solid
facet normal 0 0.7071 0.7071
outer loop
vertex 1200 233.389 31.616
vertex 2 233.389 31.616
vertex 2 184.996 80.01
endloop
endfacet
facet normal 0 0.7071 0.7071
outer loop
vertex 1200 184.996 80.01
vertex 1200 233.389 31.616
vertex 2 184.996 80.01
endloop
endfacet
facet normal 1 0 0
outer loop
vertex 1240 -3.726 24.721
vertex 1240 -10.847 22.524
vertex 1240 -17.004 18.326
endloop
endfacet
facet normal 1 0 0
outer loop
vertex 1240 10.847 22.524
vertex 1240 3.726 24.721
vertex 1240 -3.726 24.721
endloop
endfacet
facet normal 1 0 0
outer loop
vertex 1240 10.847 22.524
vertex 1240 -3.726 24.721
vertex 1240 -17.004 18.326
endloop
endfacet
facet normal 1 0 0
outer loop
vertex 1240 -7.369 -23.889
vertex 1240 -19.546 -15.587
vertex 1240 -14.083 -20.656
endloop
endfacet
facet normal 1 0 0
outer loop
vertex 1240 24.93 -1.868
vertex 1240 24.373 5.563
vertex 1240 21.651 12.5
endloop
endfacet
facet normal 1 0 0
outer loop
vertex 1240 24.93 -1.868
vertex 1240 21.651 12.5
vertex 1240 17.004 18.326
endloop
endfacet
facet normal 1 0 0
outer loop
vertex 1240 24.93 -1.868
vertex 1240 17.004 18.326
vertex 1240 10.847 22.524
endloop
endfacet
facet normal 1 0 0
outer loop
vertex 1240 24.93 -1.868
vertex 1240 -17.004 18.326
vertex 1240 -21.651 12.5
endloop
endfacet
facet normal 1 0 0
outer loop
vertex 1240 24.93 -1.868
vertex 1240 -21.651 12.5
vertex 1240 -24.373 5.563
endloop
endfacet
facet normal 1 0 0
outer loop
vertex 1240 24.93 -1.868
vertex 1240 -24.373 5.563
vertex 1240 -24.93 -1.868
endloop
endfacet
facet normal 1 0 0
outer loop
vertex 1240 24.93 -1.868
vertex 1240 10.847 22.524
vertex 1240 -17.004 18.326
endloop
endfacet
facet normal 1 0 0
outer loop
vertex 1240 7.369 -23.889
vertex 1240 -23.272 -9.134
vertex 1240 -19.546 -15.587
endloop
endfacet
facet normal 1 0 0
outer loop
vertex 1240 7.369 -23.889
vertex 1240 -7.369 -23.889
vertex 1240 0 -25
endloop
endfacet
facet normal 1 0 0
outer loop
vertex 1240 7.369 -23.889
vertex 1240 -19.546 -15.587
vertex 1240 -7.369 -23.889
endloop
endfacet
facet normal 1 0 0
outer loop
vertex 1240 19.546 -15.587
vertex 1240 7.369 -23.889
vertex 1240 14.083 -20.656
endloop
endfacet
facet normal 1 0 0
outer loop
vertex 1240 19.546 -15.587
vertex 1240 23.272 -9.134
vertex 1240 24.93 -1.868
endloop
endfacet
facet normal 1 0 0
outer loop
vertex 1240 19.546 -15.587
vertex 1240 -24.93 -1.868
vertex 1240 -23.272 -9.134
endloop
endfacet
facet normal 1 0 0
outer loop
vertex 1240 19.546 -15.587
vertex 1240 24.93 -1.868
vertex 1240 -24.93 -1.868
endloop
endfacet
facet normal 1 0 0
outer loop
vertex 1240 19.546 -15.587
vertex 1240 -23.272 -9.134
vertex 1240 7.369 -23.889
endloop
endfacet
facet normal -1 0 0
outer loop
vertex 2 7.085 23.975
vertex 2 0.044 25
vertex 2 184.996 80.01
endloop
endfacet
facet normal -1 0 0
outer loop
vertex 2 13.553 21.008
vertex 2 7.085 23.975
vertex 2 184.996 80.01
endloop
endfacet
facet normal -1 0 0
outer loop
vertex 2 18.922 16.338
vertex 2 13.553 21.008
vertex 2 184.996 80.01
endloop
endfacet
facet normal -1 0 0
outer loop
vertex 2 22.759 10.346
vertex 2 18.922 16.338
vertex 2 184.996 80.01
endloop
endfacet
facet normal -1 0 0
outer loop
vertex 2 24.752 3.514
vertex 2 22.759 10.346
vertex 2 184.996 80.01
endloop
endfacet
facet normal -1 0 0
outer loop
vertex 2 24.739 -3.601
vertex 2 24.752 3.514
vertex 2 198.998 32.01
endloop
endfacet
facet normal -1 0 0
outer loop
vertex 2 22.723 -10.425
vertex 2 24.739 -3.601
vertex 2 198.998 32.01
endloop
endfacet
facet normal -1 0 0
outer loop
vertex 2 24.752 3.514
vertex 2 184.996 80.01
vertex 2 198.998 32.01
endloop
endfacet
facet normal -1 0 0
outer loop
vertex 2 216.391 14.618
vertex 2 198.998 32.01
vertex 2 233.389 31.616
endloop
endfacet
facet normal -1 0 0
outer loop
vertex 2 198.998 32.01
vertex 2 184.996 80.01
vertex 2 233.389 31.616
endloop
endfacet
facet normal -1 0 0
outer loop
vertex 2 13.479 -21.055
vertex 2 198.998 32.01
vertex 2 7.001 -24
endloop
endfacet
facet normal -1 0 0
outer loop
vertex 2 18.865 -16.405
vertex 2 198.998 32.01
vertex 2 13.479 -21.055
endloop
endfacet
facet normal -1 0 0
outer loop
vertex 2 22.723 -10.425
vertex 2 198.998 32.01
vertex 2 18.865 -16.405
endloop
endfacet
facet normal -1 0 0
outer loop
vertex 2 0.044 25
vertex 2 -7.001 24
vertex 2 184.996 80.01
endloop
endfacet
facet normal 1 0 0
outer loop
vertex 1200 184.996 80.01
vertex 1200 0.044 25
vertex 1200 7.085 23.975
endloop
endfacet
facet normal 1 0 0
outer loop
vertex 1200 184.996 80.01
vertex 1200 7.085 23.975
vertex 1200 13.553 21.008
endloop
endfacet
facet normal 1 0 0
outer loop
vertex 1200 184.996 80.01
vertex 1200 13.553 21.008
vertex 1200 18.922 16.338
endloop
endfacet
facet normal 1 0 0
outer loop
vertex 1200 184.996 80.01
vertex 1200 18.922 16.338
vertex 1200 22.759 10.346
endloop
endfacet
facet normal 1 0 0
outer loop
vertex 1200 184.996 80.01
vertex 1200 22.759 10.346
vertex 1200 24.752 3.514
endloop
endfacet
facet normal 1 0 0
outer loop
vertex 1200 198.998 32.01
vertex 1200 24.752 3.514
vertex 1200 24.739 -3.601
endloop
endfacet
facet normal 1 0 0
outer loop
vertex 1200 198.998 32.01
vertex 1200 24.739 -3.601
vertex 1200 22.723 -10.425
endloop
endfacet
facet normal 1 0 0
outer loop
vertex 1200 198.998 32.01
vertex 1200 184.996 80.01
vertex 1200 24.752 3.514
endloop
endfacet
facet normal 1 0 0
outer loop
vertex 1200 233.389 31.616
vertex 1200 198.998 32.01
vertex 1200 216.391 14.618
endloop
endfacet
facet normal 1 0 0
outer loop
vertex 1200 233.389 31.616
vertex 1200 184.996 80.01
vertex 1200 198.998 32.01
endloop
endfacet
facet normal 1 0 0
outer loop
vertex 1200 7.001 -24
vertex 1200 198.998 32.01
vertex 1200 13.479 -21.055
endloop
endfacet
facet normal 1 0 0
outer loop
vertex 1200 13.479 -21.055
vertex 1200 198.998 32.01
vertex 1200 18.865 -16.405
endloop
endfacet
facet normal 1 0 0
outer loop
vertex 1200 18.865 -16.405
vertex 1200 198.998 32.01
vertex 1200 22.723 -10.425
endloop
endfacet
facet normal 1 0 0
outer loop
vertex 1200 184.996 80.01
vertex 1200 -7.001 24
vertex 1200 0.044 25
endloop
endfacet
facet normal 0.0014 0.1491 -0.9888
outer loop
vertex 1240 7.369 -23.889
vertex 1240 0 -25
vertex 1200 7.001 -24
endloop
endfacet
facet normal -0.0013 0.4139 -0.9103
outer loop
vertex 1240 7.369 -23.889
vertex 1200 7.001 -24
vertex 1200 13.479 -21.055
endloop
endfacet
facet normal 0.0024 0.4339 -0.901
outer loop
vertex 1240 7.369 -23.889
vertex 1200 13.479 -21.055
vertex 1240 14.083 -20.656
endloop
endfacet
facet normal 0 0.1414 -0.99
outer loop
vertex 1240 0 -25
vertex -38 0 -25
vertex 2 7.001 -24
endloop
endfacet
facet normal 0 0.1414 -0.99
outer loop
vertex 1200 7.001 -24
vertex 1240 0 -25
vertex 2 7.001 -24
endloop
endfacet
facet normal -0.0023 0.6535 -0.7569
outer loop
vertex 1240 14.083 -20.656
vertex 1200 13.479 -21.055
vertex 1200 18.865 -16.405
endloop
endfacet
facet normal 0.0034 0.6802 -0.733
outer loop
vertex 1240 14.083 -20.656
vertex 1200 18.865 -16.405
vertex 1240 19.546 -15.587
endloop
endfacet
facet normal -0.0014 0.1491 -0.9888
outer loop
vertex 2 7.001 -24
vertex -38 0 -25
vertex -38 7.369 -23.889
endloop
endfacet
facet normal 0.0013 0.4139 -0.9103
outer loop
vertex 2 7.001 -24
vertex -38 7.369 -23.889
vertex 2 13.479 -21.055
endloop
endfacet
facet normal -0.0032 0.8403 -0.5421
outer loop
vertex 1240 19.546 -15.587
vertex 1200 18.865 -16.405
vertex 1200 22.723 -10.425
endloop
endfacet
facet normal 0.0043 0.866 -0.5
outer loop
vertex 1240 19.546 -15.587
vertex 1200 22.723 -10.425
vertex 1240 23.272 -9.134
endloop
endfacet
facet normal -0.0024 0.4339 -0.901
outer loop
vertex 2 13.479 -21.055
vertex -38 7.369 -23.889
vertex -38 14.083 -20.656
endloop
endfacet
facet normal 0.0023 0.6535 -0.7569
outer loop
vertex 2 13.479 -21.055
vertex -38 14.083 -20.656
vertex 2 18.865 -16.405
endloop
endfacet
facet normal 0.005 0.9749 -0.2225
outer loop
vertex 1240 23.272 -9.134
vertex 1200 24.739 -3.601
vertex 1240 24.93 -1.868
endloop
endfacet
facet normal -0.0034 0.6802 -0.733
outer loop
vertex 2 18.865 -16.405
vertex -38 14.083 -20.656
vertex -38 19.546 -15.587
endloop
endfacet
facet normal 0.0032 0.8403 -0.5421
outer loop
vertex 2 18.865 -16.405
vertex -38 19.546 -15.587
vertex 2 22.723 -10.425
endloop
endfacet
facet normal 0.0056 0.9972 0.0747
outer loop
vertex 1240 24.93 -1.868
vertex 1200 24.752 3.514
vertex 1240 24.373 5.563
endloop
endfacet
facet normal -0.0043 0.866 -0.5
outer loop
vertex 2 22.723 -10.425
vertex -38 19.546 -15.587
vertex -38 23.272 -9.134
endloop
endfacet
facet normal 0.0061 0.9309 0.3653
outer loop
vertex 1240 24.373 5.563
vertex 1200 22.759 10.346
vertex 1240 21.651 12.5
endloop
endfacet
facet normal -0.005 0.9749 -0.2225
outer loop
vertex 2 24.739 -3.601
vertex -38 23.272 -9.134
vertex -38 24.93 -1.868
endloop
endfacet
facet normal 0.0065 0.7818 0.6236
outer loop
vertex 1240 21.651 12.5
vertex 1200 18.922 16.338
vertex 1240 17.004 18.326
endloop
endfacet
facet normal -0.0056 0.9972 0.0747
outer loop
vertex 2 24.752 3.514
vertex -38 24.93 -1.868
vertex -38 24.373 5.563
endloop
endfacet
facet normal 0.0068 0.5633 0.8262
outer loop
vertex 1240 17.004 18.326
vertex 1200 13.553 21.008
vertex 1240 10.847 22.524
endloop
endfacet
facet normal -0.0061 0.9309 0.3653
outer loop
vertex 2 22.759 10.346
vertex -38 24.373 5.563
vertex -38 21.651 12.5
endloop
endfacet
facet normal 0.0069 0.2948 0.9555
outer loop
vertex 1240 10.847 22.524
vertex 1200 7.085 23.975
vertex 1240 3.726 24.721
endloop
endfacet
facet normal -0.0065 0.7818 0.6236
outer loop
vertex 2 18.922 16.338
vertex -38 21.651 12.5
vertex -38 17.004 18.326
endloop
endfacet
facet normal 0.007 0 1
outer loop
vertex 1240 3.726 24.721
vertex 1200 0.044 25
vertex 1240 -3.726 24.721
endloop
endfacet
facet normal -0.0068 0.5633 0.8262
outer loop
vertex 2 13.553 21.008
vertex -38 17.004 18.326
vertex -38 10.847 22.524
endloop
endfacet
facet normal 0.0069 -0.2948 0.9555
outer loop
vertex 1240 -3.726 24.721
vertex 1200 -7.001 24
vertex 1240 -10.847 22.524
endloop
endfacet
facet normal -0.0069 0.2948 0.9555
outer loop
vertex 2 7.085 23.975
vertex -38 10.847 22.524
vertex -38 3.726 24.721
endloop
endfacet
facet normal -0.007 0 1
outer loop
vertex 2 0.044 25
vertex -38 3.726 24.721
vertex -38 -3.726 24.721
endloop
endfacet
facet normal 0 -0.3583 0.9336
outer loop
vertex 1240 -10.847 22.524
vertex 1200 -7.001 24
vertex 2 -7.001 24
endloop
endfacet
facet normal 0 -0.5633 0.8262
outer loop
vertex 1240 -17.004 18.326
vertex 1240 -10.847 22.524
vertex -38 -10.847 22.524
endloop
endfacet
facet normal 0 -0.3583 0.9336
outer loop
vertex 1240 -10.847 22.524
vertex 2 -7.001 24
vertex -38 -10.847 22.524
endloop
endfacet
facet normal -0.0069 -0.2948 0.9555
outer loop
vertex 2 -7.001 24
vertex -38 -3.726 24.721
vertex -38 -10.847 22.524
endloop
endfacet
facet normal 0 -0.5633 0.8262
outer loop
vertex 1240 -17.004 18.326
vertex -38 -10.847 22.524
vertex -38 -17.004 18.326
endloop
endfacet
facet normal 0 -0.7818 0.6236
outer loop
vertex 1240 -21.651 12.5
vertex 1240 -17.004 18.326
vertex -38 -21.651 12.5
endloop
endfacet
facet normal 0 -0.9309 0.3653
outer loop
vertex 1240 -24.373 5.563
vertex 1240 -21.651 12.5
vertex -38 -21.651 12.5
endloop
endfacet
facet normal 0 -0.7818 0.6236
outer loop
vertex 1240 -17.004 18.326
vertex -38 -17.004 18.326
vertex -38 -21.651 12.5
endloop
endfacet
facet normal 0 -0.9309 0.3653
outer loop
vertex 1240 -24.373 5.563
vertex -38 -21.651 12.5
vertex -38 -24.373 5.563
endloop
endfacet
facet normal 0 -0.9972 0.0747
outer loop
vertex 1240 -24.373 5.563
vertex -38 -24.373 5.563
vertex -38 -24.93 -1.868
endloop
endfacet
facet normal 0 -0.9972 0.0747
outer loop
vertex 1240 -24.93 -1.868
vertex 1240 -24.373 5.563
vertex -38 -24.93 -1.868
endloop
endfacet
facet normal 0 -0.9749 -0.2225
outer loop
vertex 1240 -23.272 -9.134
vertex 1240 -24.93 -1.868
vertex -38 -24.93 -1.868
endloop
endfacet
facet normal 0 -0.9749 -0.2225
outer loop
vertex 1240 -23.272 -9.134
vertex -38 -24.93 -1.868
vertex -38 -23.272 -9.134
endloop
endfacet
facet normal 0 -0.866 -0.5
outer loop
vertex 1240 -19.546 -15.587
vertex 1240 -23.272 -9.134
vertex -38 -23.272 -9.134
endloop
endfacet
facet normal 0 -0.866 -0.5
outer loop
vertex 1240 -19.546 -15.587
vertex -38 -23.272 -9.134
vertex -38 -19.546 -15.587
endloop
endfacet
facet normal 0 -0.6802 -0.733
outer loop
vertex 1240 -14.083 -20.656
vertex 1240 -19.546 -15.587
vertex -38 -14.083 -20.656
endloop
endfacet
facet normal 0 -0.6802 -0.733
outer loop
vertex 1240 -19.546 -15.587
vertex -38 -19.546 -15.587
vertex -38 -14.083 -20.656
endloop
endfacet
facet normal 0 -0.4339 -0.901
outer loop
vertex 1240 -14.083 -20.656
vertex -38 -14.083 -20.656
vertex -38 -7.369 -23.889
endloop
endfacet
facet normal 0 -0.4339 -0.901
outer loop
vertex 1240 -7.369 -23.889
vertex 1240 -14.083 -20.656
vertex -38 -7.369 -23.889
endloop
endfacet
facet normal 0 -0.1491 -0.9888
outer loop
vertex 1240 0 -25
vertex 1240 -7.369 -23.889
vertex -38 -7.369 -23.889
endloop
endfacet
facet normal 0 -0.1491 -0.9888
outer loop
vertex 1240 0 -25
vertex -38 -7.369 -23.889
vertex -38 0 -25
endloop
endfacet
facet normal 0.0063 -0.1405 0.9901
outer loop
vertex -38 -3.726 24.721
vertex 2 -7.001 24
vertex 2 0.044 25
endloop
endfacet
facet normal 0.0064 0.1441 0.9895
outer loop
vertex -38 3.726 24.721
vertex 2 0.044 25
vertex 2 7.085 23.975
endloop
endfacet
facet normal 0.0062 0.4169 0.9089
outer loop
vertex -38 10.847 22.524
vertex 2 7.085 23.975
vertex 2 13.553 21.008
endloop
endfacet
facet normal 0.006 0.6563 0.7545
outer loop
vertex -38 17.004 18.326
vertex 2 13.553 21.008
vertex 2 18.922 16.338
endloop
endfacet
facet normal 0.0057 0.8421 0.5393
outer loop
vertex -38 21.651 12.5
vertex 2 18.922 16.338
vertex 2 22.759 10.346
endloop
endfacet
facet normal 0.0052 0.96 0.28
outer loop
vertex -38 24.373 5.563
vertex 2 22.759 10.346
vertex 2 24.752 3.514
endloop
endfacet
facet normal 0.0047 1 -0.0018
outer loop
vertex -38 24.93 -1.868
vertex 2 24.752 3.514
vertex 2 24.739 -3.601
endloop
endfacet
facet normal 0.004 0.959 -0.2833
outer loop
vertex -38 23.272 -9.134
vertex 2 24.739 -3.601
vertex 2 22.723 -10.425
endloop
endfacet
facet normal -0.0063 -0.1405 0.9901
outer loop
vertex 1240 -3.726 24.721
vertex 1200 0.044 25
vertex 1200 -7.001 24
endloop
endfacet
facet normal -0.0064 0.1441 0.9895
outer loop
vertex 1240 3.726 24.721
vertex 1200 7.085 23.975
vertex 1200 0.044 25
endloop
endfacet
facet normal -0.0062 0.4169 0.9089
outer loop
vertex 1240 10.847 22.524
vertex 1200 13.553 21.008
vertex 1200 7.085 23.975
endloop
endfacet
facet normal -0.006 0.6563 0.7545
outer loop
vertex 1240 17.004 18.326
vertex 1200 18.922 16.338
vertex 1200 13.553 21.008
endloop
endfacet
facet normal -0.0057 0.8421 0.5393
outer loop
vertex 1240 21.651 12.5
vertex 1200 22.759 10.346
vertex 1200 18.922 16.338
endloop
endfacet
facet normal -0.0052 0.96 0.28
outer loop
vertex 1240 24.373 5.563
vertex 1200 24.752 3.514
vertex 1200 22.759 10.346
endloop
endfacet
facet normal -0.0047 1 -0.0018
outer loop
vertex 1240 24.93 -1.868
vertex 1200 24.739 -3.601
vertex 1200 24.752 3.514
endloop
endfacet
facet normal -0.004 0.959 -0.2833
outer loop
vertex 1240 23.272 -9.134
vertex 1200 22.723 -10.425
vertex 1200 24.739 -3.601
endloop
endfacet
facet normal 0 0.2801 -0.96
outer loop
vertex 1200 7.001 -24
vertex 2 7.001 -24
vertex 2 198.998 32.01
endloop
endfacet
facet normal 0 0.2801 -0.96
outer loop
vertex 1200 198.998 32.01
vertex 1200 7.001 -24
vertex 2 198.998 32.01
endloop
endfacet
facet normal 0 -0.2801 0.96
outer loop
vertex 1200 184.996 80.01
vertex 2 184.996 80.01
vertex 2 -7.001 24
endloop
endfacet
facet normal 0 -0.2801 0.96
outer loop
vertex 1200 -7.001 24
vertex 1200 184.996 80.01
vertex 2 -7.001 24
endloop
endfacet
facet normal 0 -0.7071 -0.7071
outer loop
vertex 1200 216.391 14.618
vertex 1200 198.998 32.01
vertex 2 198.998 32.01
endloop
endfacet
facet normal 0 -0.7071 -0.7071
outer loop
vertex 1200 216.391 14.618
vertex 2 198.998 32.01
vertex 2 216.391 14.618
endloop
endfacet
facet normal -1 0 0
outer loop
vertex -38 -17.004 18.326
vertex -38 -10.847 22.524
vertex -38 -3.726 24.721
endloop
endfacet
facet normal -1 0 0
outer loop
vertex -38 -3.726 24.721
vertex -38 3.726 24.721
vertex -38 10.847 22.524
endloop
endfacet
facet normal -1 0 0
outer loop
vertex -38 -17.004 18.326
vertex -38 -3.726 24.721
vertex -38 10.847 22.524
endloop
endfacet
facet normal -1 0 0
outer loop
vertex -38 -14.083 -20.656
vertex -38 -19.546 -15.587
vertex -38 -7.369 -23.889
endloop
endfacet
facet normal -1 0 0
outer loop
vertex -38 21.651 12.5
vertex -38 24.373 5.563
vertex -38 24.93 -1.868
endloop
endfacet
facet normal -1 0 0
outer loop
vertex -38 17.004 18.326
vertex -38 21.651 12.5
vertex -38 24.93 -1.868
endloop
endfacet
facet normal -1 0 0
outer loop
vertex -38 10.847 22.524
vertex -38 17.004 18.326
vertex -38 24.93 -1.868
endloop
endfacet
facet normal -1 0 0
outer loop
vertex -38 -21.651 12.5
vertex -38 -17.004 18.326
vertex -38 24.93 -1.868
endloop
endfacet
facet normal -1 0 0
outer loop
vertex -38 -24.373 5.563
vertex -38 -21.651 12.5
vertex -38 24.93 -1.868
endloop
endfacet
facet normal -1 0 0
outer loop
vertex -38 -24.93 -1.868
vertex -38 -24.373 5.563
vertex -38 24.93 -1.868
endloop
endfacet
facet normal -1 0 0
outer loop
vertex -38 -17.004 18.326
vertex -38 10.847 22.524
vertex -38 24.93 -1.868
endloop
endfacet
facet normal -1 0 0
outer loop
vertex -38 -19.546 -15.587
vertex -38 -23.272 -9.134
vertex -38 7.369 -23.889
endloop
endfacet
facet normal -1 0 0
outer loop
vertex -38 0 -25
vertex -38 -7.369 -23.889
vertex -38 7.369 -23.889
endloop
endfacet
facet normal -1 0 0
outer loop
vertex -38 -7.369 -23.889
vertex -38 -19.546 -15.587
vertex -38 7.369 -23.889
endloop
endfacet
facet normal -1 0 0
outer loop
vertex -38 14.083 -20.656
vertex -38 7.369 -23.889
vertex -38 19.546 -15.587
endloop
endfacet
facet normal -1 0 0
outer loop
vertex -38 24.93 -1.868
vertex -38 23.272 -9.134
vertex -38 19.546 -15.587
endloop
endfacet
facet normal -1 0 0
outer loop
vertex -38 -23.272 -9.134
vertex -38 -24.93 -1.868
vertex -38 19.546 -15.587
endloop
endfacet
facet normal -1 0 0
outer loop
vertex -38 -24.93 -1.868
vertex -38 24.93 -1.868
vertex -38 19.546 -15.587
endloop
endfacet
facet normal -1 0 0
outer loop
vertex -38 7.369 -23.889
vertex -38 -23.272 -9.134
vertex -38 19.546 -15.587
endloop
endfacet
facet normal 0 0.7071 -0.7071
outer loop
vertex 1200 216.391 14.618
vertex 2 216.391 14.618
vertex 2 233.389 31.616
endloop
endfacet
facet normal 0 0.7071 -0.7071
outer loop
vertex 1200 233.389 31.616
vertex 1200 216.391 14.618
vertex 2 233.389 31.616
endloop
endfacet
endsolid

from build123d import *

# Parameters (mm, degrees)
SKETCH1_R                = 25
BOSS_EXTRUDE1_DEPTH      = 1200
BOSS_EXTRUDE2_START      = -1198
BOSS_EXTRUDE2_DEPTH      = 1198
BOSS_EXTRUDE3_DEPTH      = 40
BOSS_EXTRUDE3_DEPTH_BACK = 1238
SKETCH3_R                = 25


with BuildPart() as part:
    # Sketch1 → Boss-Extrude1 (new body)
    with BuildSketch(Plane(origin=(0, 0, 0), x_dir=(0, 0, -1), z_dir=(1, 0, 0))):
        Circle(SKETCH1_R)
    extrude(amount=BOSS_EXTRUDE1_DEPTH)

    # Sketch2 → Boss-Extrude2 (add)
    with BuildSketch(Plane(origin=(1200, 0, 0), x_dir=(0, 0, -1), z_dir=(1, 0, 0)).offset(BOSS_EXTRUDE2_START)):
        with BuildLine():
            Line((23.999631554, 7.001263118), (-32.01047339, 198.998315554))
            Line((-32.01047339, 198.998315554), (-14.618110395, 216.390678549))
            Line((-14.618110395, 216.390678549), (-31.616478831, 233.389046986))
            Line((-31.616478831, 233.389046986), (-80.009736499, 184.995789318))
            Line((-80.009736499, 184.995789318), (-23.999631554, -7.001263118))
            ThreePointArc((-23.999631554, -7.001263118), (-7.001263118, 23.999631554), (23.999631554, 7.001263118))
        make_face()
    extrude(amount=BOSS_EXTRUDE2_DEPTH)

    # Sketch3 → Boss-Extrude3 (add, two sides: drawn at the far end of the back side and taken through both)
    with BuildSketch(Plane(origin=(1200, 0, 0), x_dir=(0, 0, -1), z_dir=(1, 0, 0)).offset(-BOSS_EXTRUDE3_DEPTH_BACK)):
        Circle(SKETCH3_R)
    extrude(amount=BOSS_EXTRUDE3_DEPTH + BOSS_EXTRUDE3_DEPTH_BACK)


solid = part.part
